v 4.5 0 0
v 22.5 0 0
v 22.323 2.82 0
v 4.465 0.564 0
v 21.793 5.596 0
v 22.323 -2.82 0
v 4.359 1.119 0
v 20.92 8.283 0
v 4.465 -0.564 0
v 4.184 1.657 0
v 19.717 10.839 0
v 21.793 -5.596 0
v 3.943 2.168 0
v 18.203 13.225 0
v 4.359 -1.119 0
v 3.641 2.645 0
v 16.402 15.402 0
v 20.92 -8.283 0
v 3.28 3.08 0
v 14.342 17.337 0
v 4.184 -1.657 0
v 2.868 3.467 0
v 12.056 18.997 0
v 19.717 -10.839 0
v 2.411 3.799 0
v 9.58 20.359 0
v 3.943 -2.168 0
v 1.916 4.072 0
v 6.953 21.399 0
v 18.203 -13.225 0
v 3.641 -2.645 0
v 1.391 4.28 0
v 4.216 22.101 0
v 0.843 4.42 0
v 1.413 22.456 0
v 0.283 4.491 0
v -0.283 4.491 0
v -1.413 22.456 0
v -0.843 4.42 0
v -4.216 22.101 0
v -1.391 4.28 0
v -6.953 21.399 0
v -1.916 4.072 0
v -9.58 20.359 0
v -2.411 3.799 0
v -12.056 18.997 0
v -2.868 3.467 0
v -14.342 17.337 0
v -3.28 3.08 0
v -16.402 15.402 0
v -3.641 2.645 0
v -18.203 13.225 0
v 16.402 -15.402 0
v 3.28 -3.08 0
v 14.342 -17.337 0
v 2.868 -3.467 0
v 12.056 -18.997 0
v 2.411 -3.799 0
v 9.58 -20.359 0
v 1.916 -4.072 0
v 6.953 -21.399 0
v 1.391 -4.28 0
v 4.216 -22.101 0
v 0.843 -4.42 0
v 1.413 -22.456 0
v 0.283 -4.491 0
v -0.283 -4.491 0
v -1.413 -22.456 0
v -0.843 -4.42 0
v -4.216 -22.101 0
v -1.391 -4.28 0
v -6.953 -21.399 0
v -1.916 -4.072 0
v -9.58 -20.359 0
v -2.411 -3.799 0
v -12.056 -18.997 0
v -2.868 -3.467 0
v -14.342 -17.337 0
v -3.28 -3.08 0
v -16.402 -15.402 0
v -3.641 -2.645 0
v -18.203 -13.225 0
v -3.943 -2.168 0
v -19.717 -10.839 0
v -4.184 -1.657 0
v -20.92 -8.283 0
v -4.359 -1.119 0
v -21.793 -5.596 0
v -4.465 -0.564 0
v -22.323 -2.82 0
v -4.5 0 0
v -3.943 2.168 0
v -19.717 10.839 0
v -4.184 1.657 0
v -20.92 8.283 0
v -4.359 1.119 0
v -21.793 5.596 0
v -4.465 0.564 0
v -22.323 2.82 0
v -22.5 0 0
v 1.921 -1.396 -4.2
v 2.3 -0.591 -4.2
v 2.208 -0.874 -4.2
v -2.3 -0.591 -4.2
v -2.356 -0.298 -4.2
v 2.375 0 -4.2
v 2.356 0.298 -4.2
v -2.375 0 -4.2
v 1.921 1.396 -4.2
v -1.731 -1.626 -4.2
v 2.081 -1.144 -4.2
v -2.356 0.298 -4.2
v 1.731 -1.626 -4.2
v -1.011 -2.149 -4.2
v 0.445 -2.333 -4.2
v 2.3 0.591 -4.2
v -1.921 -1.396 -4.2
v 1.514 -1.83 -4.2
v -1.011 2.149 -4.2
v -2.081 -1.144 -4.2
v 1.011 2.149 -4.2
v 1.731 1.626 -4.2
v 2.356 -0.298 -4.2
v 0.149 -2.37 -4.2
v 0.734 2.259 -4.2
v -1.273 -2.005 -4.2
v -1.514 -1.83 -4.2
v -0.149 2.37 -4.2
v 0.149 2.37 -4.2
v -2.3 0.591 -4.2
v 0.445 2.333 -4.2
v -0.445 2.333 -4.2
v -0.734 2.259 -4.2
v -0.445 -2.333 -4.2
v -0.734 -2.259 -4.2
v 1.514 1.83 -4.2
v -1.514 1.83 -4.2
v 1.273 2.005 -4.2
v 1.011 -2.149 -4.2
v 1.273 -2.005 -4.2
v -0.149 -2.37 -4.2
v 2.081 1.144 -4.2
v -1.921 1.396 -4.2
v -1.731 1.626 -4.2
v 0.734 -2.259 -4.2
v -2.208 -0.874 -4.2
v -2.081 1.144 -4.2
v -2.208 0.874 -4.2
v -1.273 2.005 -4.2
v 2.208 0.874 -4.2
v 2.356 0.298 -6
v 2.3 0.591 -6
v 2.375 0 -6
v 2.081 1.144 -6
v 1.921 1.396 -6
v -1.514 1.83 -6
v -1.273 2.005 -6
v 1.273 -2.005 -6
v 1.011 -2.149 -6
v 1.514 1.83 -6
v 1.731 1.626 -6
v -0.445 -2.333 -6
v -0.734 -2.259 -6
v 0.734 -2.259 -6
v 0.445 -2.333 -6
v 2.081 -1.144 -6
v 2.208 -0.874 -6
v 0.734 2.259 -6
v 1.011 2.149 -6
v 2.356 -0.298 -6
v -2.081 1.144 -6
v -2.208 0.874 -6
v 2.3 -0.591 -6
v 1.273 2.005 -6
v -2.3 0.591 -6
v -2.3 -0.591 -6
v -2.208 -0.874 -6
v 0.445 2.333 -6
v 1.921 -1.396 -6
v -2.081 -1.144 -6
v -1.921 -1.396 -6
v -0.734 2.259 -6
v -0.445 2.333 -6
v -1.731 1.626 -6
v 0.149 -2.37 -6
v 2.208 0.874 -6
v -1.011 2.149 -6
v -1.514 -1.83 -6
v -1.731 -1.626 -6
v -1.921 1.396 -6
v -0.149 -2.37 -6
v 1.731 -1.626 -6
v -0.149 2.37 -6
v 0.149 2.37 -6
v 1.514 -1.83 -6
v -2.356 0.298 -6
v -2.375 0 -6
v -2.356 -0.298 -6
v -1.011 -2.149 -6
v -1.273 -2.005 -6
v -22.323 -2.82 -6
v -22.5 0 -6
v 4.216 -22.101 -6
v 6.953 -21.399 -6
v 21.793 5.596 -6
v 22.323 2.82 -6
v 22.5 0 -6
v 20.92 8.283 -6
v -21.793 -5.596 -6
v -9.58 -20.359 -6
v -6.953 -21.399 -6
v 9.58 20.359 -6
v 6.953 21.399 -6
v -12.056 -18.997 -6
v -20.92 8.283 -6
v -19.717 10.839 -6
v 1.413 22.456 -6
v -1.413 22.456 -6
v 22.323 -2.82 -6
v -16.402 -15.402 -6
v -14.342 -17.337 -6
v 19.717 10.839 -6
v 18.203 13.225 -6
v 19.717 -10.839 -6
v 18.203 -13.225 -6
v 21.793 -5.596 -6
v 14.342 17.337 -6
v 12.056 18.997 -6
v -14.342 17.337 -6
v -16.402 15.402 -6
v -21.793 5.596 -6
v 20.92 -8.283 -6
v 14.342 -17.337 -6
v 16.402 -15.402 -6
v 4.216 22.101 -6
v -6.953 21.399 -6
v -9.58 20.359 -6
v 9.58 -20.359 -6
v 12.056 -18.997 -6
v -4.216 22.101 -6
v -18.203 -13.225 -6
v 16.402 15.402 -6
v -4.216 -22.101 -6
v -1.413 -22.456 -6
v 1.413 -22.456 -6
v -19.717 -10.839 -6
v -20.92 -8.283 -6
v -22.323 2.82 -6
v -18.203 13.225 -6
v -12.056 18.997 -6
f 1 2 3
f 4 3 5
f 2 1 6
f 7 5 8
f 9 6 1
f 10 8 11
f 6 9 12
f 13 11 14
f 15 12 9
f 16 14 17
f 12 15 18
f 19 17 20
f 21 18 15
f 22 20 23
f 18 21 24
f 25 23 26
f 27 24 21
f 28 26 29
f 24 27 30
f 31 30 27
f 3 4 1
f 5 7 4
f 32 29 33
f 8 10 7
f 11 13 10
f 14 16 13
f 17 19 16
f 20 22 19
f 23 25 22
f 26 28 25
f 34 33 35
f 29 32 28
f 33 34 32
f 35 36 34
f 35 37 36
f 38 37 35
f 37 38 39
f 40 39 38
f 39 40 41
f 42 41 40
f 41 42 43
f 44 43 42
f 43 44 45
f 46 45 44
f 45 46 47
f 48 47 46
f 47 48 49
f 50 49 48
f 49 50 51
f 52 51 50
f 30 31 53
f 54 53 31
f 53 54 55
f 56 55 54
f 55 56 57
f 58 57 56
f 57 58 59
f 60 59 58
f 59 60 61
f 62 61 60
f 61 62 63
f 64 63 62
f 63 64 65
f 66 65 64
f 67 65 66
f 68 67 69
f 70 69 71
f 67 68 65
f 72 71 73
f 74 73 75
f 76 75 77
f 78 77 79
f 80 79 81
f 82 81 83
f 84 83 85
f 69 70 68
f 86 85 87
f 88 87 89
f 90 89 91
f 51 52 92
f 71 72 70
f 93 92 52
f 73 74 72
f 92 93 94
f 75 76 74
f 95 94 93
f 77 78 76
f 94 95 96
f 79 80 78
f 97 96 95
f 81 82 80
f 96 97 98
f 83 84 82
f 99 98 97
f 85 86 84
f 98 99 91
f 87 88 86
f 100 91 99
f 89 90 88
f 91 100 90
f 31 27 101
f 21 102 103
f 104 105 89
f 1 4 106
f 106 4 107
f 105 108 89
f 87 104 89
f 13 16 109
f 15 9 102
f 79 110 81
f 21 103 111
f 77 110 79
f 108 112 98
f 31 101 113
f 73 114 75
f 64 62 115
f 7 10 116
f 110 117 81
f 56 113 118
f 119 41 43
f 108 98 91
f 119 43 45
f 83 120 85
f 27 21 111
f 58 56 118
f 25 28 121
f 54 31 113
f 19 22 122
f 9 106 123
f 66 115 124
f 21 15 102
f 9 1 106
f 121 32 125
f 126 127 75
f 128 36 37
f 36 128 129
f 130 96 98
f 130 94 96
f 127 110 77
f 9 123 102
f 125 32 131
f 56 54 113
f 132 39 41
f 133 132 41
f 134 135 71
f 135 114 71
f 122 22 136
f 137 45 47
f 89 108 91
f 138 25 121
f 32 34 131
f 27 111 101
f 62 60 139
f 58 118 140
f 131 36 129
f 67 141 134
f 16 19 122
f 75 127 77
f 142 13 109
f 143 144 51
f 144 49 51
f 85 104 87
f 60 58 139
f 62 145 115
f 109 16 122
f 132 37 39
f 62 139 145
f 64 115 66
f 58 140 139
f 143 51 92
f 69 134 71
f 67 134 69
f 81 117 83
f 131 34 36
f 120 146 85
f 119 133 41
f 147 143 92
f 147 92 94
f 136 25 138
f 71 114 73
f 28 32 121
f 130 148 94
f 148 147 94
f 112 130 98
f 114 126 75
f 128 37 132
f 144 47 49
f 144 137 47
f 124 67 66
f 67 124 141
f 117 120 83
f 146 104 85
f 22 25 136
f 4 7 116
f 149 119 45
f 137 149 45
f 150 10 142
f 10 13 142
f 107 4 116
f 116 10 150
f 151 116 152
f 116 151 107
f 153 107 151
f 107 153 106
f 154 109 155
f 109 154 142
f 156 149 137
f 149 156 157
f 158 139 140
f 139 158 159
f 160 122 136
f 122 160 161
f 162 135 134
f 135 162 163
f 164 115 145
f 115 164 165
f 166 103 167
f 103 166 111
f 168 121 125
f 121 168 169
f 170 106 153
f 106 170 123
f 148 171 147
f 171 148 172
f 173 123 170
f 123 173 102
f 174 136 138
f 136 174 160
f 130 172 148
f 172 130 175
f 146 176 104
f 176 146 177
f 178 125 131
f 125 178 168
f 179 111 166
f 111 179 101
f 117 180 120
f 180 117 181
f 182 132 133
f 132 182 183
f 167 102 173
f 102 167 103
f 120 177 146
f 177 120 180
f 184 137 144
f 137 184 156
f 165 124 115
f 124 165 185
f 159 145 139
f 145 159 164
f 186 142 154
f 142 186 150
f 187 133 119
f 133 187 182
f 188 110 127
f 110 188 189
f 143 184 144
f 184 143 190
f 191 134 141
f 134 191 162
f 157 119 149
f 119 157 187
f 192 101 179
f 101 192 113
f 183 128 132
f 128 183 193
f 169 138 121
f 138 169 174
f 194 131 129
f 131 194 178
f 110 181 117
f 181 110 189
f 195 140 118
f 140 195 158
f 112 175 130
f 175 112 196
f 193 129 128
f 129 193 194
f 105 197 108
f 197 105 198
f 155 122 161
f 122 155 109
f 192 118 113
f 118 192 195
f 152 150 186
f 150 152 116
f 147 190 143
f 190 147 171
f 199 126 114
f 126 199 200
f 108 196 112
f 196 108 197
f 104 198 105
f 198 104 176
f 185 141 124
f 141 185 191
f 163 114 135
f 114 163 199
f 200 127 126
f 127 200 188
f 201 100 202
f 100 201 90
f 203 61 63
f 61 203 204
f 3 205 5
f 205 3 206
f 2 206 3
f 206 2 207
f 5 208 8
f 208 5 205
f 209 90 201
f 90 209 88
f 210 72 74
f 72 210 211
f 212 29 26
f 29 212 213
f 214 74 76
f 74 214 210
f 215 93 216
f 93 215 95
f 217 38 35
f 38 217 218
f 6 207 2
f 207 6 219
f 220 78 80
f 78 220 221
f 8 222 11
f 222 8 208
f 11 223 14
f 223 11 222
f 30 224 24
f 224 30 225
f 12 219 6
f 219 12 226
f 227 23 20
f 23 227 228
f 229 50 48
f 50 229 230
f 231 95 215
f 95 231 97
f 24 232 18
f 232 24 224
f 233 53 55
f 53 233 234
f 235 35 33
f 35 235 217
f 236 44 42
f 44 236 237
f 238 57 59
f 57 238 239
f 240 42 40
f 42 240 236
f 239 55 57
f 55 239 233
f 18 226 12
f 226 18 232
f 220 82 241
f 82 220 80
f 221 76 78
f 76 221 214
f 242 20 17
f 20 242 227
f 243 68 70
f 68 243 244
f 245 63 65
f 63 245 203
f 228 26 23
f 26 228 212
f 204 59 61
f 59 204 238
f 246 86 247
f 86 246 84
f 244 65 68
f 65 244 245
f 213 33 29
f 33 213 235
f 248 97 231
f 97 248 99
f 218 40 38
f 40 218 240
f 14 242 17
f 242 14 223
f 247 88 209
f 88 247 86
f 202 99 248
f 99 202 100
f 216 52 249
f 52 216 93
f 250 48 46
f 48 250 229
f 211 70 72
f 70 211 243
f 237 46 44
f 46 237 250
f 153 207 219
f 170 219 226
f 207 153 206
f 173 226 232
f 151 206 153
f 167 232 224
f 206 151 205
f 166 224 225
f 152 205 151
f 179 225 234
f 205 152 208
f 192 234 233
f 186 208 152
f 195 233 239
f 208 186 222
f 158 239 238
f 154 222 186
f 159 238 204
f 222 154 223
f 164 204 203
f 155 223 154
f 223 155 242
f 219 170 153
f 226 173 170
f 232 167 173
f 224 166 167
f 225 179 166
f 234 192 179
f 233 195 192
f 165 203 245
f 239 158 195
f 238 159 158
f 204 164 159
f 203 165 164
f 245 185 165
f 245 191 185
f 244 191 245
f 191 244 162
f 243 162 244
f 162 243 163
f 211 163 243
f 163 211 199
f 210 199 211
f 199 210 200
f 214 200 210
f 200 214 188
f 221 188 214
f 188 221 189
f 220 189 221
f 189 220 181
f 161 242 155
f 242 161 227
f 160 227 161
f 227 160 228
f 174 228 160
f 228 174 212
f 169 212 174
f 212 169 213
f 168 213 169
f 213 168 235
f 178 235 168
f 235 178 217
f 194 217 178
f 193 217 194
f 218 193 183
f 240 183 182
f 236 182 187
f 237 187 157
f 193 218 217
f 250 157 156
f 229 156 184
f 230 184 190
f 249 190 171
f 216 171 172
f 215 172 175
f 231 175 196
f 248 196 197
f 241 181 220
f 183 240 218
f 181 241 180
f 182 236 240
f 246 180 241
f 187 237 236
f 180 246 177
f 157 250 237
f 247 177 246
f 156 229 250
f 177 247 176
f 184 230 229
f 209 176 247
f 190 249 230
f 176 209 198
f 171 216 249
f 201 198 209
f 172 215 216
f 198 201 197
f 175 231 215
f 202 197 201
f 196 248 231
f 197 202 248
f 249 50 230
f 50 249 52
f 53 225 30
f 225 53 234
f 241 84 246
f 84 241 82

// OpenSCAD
$fn = 50;

difference() {
	union() {
		translate(v = [0, 0, -6.0]) {
			cylinder(h = 6, r = 22.5);
		}
	}
	union() {
		translate(v = [0, 0, 0]) {
			rotate(a = [0, 0, 0]) {
				difference() {
					union() {
						translate(v = [0, 0, -9.0]) {
							cylinder(h = 9, r = 2.25);
						}
						translate(v = [0, 0, -4.2]) {
							cylinder(h = 4.2, r1 = 2.375, r2 = 4.5);
						}
						translate(v = [0, 0, -9.0]) {
							cylinder(h = 9, r = 2.375);
						}
						translate(v = [0, 0, -9.0]) {
							cylinder(h = 9, r = 2.25);
						}
					}
					union();
				}
			}
		}
	}
}
